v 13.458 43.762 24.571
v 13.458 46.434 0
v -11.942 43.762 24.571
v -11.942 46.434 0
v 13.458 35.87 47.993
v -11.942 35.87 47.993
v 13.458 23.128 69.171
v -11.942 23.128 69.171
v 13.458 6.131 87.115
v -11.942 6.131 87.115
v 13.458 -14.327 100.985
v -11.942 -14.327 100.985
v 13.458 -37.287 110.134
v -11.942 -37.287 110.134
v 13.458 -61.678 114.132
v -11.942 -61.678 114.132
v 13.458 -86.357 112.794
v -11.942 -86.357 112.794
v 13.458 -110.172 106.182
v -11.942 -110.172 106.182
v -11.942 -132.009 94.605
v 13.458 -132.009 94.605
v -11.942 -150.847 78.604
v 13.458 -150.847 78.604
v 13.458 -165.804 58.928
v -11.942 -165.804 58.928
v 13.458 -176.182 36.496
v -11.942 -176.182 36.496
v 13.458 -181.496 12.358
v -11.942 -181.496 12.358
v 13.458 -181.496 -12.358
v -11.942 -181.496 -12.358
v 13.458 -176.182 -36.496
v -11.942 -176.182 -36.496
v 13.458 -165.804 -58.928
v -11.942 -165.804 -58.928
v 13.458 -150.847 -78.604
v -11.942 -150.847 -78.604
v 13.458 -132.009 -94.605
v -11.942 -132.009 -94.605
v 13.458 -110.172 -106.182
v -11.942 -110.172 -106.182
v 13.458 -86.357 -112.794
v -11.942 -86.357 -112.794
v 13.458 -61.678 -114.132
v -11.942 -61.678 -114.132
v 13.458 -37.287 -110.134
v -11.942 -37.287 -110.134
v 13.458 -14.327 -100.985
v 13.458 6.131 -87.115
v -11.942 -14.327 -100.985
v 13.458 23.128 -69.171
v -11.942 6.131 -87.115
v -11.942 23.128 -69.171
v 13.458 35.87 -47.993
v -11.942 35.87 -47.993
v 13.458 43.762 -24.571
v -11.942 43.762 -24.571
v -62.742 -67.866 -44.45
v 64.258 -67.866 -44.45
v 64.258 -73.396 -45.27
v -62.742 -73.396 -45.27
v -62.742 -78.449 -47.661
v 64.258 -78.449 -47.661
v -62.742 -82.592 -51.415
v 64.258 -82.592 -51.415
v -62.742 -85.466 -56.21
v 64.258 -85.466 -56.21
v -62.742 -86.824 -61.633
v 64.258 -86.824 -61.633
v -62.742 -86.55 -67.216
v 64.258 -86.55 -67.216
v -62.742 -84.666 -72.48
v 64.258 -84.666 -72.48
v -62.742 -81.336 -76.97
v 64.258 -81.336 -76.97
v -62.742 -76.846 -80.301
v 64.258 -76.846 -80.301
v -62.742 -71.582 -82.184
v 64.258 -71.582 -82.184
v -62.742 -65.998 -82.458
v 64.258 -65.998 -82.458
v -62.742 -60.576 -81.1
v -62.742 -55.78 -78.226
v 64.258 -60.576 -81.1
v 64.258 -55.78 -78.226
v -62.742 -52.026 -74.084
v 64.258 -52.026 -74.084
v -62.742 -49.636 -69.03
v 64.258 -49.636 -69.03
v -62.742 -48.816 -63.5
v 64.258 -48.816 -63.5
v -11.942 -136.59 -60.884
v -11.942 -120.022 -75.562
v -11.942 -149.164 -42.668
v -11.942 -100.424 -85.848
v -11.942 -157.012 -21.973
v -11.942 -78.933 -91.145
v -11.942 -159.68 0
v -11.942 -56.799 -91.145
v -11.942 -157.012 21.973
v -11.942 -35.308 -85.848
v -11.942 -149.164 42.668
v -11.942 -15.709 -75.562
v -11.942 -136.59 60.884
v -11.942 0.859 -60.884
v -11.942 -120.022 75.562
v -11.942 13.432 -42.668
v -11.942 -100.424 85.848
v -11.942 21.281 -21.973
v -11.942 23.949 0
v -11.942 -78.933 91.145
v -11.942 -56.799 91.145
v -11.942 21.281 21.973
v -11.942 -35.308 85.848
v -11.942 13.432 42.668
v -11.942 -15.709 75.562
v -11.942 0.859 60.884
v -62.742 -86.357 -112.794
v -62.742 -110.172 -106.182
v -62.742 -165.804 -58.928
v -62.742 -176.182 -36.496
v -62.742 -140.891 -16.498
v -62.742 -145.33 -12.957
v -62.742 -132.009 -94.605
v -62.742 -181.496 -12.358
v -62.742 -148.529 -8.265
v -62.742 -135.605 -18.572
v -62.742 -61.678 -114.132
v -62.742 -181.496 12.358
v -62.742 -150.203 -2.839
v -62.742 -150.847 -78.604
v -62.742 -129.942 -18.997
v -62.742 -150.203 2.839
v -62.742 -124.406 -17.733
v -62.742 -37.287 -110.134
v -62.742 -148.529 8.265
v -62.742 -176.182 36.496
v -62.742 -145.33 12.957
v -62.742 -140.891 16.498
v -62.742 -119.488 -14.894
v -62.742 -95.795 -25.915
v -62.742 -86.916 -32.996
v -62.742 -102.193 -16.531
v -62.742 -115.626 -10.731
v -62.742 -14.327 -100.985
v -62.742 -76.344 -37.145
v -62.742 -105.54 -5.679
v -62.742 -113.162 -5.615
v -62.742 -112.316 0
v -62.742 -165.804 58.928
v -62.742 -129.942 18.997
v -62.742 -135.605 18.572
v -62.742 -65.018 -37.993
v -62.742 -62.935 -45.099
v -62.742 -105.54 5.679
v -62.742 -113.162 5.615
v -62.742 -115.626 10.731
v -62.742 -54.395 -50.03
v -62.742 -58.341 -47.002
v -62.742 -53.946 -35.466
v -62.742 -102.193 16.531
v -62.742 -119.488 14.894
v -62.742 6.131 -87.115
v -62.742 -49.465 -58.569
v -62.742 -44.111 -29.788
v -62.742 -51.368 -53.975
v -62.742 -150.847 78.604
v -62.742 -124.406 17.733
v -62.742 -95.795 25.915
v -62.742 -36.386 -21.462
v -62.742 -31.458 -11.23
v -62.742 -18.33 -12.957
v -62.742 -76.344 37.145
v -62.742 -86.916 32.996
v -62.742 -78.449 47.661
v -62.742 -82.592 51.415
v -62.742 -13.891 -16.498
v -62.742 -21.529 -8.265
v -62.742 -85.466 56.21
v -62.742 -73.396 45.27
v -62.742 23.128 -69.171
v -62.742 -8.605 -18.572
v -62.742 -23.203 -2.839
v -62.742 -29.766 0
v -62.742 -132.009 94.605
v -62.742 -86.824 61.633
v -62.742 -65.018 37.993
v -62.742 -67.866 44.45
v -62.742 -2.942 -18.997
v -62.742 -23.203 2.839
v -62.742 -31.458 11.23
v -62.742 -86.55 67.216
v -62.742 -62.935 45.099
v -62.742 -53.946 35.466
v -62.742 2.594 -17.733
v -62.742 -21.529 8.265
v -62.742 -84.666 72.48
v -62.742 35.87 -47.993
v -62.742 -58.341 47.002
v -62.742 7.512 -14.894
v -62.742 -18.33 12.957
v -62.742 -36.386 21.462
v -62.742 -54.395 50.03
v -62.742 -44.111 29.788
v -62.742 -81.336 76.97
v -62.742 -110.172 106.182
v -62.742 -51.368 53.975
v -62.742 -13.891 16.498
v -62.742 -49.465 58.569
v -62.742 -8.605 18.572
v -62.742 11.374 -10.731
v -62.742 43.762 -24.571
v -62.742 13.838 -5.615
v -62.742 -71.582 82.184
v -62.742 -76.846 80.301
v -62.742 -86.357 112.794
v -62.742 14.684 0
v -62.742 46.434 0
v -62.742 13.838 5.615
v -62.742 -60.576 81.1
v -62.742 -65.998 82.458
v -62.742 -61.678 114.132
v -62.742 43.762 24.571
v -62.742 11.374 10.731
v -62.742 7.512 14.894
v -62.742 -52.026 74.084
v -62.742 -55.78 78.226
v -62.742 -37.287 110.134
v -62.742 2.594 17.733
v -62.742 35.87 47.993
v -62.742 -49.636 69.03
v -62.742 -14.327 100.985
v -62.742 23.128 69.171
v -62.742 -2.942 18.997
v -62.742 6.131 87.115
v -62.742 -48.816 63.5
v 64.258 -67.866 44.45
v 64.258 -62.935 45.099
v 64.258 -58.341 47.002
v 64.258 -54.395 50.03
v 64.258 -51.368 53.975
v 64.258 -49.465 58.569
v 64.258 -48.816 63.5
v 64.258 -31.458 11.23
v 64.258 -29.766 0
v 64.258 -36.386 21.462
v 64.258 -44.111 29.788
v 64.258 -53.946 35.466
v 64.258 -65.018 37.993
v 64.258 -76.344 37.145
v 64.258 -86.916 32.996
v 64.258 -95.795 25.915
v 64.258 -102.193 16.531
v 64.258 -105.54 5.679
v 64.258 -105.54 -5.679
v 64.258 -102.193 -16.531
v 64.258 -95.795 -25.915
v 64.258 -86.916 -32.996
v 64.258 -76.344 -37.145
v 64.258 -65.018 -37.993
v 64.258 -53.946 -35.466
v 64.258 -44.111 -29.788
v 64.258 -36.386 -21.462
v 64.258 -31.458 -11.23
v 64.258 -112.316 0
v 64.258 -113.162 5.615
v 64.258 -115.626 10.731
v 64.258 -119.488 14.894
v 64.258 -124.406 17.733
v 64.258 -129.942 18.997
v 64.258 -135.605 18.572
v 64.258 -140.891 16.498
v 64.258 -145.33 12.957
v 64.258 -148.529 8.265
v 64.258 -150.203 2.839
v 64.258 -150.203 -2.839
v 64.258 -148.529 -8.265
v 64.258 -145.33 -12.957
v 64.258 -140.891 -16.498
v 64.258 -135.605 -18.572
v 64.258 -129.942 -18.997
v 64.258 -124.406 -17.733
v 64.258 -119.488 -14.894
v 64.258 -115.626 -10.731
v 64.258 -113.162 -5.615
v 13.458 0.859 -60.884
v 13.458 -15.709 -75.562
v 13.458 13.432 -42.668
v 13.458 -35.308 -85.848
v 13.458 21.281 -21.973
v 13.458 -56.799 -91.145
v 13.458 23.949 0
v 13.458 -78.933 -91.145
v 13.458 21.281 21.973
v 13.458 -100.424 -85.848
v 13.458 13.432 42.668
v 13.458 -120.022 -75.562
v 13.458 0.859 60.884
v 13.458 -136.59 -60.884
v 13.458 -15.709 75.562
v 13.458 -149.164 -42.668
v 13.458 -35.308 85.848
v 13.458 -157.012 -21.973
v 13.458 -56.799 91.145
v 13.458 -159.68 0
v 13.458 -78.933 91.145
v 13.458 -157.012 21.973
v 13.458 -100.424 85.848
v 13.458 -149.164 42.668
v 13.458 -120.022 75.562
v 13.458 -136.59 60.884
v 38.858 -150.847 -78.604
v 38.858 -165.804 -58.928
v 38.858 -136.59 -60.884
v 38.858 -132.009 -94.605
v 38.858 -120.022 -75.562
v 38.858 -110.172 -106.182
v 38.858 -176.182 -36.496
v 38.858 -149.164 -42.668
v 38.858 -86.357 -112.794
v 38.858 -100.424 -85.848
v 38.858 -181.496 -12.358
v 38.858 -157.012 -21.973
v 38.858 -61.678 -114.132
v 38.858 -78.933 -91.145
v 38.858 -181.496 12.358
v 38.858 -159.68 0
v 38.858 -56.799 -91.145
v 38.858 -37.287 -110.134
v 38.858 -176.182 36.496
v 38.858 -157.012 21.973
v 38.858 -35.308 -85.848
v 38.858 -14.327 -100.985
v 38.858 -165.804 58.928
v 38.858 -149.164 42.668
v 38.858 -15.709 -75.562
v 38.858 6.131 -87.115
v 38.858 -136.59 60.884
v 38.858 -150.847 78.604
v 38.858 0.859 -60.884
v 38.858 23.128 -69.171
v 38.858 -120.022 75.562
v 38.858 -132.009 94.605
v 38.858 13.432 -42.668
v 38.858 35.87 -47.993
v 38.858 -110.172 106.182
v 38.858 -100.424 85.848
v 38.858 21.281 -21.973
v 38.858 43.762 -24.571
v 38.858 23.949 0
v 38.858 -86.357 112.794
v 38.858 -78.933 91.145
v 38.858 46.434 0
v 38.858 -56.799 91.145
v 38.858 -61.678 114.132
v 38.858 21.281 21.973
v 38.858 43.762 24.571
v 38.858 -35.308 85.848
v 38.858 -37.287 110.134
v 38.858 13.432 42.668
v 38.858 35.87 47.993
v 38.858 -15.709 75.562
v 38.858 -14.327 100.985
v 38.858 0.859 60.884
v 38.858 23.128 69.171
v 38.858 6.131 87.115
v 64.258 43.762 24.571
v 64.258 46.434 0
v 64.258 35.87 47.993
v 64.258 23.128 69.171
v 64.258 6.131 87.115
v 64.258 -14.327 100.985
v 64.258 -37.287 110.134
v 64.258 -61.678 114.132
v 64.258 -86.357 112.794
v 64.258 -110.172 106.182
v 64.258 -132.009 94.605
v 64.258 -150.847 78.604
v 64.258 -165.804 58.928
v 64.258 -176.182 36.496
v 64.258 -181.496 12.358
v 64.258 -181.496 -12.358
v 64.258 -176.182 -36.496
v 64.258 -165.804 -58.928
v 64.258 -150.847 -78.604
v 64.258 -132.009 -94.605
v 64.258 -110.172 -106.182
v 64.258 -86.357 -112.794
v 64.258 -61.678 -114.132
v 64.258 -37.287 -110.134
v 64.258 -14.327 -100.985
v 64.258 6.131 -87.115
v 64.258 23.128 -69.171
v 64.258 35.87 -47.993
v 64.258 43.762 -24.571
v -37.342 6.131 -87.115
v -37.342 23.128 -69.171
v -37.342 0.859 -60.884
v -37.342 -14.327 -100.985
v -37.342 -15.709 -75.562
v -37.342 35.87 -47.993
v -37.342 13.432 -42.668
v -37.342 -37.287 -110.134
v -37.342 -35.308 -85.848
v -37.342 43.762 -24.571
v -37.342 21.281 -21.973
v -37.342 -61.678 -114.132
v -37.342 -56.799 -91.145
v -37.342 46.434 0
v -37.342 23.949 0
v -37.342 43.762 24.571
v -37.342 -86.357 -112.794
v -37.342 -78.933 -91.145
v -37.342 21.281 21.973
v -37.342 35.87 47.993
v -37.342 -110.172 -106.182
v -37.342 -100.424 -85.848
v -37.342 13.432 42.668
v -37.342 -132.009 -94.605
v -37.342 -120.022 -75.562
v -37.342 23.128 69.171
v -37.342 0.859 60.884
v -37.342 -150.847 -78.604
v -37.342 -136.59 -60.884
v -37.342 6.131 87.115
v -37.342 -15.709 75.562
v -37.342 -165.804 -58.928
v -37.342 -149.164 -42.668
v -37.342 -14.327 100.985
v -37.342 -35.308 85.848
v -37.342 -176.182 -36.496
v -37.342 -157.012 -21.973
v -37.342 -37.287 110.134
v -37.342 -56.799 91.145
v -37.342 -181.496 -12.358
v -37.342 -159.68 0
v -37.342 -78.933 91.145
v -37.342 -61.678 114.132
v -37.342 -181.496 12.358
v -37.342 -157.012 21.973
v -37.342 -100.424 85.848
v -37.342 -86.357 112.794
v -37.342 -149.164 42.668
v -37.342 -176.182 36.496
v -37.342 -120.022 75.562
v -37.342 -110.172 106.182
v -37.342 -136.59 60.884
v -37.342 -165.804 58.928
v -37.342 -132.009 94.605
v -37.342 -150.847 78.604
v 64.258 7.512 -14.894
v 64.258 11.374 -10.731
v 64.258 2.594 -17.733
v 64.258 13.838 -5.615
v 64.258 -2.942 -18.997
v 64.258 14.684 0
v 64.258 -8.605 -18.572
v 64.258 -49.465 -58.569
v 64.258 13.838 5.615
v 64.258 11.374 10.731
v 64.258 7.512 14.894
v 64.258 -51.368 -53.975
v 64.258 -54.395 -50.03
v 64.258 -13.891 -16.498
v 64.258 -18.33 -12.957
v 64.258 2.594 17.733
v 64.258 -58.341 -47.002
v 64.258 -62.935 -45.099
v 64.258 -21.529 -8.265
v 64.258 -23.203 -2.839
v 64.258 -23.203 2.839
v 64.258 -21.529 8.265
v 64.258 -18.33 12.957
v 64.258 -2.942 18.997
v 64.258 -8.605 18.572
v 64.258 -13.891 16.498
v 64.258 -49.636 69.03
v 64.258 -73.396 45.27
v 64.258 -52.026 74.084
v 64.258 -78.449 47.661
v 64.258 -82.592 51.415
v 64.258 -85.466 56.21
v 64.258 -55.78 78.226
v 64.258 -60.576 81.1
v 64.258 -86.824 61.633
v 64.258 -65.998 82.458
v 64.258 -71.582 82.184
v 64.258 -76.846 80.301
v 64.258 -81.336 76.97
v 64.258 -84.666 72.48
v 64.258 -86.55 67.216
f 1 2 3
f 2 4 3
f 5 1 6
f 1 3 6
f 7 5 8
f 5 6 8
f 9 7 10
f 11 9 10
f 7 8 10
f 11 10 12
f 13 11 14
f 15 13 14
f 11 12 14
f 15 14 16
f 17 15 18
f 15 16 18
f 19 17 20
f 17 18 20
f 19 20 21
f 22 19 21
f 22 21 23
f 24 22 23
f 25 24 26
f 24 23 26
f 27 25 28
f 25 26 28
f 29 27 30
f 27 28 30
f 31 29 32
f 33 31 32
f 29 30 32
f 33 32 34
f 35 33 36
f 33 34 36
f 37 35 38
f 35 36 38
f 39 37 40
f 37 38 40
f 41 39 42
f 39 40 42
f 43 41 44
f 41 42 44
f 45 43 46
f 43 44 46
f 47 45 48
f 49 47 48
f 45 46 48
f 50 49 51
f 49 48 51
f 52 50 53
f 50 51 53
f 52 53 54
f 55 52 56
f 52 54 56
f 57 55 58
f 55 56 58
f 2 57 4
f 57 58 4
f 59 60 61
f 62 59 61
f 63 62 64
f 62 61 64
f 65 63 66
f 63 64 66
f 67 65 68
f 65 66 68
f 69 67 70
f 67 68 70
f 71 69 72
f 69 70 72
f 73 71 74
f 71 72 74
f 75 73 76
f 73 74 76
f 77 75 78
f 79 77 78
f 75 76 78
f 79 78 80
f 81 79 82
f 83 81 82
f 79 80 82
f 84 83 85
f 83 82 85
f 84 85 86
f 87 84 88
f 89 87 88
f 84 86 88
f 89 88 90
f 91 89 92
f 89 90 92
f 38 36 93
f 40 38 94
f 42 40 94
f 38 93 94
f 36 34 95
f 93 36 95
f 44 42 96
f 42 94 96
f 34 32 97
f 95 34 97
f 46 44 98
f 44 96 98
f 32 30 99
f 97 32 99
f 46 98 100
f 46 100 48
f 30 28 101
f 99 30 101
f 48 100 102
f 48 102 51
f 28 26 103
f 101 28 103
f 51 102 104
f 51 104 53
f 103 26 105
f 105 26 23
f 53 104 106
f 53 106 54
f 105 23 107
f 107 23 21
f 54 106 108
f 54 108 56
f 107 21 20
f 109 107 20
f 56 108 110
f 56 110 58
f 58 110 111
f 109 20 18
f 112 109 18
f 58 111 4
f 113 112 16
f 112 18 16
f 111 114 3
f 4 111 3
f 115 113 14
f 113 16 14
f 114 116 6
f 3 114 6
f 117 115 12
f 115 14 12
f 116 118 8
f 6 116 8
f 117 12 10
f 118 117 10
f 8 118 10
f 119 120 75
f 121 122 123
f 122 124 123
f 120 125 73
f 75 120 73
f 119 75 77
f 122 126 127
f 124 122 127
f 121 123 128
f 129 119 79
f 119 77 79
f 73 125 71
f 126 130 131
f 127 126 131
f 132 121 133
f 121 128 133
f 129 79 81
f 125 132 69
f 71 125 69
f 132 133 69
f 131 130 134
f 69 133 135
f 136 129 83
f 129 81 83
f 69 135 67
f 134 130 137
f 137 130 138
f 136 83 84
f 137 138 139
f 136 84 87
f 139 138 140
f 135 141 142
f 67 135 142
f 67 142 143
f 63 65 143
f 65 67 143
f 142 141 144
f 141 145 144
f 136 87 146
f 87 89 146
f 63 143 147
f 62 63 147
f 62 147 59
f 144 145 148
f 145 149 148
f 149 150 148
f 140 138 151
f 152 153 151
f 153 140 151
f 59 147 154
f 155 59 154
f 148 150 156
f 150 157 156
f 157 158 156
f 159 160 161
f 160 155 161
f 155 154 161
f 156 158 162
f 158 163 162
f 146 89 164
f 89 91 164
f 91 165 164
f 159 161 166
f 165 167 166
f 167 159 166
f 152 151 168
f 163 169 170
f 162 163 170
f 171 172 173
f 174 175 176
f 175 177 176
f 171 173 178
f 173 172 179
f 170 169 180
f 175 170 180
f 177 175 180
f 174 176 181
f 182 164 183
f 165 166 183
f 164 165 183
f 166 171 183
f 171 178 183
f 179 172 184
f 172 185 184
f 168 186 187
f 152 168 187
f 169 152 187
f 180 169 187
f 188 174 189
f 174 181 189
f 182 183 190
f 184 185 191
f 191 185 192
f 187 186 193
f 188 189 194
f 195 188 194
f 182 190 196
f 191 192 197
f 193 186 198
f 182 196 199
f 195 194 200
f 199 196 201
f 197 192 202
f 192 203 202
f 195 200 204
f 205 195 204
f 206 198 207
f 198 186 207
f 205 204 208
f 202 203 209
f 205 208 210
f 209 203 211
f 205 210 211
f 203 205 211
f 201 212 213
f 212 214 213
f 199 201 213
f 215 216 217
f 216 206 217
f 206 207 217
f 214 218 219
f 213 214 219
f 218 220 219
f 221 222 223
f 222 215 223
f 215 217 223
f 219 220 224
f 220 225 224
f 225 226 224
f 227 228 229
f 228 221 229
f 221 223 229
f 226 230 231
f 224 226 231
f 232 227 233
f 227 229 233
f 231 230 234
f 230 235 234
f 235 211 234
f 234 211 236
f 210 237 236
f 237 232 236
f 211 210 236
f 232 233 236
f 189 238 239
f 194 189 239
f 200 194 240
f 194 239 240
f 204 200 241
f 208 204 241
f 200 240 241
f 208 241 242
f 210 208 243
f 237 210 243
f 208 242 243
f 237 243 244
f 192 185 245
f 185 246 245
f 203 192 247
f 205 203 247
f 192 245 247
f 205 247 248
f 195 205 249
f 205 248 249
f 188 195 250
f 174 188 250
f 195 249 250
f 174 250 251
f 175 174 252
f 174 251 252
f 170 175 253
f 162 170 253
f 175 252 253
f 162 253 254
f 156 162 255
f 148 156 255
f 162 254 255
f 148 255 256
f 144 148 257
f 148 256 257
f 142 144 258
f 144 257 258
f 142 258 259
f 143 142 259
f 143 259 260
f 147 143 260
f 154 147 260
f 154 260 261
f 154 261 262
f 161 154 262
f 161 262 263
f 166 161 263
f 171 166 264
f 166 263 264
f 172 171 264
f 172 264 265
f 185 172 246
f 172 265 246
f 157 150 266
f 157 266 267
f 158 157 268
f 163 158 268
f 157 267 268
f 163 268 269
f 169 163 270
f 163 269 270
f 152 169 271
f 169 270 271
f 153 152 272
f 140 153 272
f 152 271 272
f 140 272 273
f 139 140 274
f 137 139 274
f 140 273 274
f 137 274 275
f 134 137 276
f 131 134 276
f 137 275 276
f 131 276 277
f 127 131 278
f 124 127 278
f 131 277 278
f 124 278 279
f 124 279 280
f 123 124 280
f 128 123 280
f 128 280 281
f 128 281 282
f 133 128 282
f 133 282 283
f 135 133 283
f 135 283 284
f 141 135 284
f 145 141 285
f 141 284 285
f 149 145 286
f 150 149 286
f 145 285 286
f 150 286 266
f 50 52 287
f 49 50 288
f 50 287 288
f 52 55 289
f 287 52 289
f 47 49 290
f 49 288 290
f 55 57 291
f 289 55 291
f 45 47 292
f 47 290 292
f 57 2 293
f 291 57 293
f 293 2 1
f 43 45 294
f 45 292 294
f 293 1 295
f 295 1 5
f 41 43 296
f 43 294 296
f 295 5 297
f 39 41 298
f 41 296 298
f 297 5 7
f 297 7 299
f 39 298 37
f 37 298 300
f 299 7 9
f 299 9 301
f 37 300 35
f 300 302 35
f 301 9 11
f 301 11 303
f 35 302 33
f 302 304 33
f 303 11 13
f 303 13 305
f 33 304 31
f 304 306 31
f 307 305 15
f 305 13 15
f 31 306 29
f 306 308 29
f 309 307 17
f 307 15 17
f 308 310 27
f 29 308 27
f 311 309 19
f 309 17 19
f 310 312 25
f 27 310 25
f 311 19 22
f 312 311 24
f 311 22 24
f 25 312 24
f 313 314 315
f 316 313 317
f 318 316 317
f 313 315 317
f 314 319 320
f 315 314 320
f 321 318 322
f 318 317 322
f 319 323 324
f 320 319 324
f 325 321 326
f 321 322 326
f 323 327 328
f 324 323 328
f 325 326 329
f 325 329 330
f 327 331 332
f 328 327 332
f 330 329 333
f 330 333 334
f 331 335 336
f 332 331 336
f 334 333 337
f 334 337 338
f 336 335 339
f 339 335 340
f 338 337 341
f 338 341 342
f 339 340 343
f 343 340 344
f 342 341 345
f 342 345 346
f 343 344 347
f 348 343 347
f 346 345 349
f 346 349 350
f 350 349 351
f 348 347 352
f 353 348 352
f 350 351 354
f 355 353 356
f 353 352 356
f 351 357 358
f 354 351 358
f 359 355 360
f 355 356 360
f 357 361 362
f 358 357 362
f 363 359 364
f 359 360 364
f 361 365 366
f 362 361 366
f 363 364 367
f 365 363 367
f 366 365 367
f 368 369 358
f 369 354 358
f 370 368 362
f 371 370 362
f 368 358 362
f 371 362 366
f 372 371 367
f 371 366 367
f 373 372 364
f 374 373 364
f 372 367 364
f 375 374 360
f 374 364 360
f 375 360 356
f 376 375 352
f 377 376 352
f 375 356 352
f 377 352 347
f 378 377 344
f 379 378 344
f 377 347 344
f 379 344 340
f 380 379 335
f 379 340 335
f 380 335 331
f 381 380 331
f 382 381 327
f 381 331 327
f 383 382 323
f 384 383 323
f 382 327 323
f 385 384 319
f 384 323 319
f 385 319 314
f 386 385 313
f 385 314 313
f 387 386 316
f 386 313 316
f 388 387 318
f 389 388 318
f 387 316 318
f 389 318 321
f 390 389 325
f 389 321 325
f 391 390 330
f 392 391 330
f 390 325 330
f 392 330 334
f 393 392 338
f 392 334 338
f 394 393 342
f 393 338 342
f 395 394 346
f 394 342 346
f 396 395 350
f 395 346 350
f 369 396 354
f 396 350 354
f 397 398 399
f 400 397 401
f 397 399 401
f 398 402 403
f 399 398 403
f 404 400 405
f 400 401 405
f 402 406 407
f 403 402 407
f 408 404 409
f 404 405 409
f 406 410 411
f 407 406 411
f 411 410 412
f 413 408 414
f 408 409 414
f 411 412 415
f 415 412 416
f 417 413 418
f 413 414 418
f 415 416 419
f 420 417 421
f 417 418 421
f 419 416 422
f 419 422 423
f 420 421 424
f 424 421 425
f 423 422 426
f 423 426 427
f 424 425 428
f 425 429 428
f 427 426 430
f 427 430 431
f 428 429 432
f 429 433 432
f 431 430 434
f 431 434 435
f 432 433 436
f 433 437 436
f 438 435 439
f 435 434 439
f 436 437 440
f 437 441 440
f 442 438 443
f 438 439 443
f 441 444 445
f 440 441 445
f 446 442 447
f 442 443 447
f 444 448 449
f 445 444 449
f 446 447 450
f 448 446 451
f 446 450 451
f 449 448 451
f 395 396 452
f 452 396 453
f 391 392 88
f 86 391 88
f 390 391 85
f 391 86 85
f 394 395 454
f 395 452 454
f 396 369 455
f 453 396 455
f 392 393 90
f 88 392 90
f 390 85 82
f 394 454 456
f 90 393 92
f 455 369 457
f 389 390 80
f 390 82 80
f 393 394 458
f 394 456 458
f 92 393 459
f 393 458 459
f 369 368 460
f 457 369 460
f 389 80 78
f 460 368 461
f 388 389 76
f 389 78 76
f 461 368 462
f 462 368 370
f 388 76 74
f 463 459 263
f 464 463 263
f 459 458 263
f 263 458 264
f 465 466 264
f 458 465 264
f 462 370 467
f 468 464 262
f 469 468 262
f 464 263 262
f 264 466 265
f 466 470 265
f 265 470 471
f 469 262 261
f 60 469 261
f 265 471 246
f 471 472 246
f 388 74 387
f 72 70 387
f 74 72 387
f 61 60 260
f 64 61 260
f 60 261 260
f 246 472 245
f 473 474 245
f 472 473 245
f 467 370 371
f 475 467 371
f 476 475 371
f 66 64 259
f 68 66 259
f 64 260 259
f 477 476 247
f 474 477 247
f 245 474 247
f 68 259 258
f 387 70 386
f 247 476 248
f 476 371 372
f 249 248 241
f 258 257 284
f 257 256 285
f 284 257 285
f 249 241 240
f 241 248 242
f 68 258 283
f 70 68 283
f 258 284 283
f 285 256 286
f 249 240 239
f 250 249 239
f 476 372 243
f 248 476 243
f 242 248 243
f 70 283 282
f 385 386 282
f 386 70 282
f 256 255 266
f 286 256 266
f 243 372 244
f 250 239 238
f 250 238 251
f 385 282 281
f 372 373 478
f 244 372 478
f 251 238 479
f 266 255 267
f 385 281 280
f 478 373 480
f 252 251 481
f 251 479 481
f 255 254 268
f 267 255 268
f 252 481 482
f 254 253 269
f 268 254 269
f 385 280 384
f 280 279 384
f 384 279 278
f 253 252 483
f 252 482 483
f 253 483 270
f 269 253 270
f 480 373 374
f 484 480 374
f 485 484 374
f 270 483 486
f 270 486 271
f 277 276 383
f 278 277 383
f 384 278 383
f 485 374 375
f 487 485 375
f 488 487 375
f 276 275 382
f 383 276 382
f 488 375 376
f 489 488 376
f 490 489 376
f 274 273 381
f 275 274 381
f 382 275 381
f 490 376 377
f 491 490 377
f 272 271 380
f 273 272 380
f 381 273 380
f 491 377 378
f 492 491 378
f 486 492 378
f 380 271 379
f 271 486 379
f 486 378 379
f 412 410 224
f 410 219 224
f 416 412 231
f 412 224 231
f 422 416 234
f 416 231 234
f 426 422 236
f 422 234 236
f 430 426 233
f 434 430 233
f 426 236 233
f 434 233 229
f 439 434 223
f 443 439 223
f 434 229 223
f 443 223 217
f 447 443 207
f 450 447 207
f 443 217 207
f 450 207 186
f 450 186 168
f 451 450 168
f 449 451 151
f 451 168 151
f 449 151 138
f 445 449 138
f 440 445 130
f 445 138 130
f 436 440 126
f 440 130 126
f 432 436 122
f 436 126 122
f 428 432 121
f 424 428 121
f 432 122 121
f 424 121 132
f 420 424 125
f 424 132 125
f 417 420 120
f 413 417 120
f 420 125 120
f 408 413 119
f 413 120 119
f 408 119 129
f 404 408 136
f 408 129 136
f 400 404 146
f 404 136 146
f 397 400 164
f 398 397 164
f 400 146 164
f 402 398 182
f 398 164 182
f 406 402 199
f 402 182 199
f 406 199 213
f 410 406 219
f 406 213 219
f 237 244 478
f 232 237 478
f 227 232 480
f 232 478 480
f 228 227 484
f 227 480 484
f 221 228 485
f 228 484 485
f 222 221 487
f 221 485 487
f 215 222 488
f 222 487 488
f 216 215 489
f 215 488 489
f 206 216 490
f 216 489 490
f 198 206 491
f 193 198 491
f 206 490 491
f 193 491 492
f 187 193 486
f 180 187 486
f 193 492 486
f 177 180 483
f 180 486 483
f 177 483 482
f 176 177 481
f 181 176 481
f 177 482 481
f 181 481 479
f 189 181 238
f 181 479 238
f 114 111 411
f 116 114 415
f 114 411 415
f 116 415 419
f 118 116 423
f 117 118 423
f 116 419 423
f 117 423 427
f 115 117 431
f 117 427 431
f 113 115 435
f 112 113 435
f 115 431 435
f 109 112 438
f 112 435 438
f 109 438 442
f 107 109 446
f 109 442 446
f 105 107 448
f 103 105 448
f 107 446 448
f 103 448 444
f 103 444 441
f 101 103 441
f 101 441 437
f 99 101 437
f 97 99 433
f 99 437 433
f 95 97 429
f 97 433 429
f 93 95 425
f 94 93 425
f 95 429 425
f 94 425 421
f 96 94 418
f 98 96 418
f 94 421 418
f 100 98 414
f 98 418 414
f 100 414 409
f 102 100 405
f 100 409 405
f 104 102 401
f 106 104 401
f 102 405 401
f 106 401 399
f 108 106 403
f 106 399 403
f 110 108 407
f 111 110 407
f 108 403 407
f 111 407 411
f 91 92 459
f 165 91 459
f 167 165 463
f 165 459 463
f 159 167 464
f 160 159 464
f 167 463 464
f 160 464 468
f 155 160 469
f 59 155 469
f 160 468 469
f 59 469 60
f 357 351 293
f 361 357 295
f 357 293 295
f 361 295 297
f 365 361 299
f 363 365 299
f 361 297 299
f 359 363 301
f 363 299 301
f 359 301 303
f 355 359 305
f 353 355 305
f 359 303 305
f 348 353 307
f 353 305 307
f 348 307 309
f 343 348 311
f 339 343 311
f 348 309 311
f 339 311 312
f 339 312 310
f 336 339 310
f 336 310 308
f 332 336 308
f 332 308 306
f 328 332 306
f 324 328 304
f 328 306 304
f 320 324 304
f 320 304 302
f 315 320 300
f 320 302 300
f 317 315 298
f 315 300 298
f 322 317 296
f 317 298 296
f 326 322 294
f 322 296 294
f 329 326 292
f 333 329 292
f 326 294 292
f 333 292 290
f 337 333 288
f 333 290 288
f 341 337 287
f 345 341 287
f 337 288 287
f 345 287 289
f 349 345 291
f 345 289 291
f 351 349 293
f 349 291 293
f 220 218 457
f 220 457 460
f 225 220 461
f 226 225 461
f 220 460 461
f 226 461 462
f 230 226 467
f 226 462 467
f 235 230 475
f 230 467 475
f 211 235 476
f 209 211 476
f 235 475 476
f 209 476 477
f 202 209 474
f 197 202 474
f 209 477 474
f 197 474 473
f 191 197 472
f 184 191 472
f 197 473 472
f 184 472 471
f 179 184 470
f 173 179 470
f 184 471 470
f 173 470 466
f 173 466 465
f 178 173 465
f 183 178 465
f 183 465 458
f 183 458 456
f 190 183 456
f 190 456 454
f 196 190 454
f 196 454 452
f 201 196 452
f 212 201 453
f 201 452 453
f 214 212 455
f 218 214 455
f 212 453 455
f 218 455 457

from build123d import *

# Parameters (mm, degrees)
F2_R     = 19.05
F3_DEPTH = 127


with BuildPart() as f1:
    # F0 (on Top) → F1 (revolve)
    with BuildSketch(Plane.XY):
        Polygon((-37.342314, 46.434332), (-62.742314, 46.434332), (-62.742314, -29.765668), (64.257686, -29.765668), (64.257686, 46.434332), (38.857686, 46.434332), (38.857686, 23.949085), (13.457686, 23.949085), (13.457686, 46.434332), (-11.942314, 46.434332), (-11.942314, 23.949085), (-37.342314, 23.949085), align=None)
    revolve(axis=Axis((0.757686, -67.865668, 0), (1, 0, 0)))

    # F2 (on face) → F3 (cut, through all)
    with BuildSketch(Plane.YZ.offset(64.257686)):
        with BuildLine():
            ThreePointArc((-67.865668, 44.45), (-54.395284, 50.029616), (-48.815668, 63.5))
            ThreePointArc((-48.815668, 63.5), (-81.336052, 76.970384), (-67.865668, 44.45))
        make_face()
        with Locations((-131.365668, 0)):
            Circle(F2_R)
        with BuildLine():
            ThreePointArc((-67.865668, -44.45), (-81.336052, -76.970384), (-48.815668, -63.5))
            ThreePointArc((-48.815668, -63.5), (-54.395284, -50.029616), (-67.865668, -44.45))
        make_face()
        with BuildLine():
            ThreePointArc((-23.415668, 0), (-4.365668, -19.05), (14.684332, 0))
            ThreePointArc((14.684332, 0), (-4.365668, 19.05), (-23.415668, 0))
        make_face()
    extrude(amount=-F3_DEPTH, mode=Mode.SUBTRACT)


solid = f1.part
